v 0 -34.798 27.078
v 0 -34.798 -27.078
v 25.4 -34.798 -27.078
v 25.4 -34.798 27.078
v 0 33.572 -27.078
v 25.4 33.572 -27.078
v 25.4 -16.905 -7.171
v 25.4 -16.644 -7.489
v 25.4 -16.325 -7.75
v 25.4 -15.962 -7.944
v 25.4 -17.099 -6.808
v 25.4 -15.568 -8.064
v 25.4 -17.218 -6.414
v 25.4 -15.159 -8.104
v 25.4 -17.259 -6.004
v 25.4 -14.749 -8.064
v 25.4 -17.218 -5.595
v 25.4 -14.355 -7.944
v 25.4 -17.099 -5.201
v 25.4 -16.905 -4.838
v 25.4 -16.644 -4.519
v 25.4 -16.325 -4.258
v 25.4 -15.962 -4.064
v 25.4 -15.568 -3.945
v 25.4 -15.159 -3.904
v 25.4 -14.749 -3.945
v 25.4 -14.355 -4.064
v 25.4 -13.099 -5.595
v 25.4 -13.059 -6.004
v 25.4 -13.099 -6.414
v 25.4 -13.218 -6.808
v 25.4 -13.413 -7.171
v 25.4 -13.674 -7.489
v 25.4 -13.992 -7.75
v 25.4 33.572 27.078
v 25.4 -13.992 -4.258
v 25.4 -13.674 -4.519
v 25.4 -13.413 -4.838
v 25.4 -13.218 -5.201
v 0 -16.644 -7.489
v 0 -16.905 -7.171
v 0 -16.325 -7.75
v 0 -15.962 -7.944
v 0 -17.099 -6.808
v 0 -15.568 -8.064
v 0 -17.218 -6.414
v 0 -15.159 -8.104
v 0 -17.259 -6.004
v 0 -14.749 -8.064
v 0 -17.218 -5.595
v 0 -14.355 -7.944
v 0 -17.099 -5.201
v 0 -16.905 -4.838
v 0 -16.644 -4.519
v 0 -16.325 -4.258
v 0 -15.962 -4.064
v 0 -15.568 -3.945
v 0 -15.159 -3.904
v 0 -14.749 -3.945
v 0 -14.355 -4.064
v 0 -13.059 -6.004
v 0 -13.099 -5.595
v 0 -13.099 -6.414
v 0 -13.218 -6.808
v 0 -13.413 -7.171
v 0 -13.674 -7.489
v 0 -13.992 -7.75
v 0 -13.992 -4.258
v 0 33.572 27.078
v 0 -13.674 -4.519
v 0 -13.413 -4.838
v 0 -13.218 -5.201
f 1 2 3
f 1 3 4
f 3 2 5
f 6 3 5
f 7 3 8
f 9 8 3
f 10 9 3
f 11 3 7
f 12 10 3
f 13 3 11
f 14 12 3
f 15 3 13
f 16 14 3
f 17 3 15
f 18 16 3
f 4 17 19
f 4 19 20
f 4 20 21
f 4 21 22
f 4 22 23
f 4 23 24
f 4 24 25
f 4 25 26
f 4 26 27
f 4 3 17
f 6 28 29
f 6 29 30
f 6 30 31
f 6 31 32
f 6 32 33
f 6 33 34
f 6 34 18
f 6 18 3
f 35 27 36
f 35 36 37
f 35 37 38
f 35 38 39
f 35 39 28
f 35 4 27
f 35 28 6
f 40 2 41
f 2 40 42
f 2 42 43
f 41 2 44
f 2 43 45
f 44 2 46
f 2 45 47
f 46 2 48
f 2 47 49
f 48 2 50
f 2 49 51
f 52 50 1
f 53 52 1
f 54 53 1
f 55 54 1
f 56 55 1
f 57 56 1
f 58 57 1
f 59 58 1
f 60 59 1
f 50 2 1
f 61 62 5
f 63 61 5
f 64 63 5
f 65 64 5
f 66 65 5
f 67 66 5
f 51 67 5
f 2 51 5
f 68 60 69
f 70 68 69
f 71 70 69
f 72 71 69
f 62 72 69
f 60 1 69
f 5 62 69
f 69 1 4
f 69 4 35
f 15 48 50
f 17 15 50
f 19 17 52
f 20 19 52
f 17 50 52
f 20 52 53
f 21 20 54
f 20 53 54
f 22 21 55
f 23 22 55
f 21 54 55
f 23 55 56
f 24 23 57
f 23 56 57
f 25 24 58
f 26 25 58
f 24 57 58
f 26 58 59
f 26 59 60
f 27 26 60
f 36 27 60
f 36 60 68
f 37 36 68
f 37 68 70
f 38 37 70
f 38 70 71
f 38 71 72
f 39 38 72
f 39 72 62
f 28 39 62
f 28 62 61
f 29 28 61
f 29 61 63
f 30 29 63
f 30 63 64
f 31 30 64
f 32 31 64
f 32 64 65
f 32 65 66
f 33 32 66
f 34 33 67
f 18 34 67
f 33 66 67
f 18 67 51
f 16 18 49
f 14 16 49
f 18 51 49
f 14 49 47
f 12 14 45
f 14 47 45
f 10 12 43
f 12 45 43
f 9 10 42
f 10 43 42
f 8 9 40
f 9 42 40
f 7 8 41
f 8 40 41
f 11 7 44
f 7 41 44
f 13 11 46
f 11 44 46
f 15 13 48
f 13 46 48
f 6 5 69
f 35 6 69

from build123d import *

# Parameters (mm, degrees)
F0_W     = 68.3699548244
F0_H     = 54.1568435729
F1_DEPTH = 25.4
F3_D     = 4.2


with BuildPart() as f1:
    # F0 (on Right) → F1 (new body)
    with BuildSketch(Plane.YZ):
        with Locations((-0.6126351655, 0)):
            Rectangle(F0_W, F0_H)
    extrude(amount=F1_DEPTH)

    # F3 (through all)
    with Locations(Plane.YZ.offset(25.4)):
        with Locations((-15.1585871354, -6.0043395497)):
            Hole(F3_D / 2)


solid = f1.part
